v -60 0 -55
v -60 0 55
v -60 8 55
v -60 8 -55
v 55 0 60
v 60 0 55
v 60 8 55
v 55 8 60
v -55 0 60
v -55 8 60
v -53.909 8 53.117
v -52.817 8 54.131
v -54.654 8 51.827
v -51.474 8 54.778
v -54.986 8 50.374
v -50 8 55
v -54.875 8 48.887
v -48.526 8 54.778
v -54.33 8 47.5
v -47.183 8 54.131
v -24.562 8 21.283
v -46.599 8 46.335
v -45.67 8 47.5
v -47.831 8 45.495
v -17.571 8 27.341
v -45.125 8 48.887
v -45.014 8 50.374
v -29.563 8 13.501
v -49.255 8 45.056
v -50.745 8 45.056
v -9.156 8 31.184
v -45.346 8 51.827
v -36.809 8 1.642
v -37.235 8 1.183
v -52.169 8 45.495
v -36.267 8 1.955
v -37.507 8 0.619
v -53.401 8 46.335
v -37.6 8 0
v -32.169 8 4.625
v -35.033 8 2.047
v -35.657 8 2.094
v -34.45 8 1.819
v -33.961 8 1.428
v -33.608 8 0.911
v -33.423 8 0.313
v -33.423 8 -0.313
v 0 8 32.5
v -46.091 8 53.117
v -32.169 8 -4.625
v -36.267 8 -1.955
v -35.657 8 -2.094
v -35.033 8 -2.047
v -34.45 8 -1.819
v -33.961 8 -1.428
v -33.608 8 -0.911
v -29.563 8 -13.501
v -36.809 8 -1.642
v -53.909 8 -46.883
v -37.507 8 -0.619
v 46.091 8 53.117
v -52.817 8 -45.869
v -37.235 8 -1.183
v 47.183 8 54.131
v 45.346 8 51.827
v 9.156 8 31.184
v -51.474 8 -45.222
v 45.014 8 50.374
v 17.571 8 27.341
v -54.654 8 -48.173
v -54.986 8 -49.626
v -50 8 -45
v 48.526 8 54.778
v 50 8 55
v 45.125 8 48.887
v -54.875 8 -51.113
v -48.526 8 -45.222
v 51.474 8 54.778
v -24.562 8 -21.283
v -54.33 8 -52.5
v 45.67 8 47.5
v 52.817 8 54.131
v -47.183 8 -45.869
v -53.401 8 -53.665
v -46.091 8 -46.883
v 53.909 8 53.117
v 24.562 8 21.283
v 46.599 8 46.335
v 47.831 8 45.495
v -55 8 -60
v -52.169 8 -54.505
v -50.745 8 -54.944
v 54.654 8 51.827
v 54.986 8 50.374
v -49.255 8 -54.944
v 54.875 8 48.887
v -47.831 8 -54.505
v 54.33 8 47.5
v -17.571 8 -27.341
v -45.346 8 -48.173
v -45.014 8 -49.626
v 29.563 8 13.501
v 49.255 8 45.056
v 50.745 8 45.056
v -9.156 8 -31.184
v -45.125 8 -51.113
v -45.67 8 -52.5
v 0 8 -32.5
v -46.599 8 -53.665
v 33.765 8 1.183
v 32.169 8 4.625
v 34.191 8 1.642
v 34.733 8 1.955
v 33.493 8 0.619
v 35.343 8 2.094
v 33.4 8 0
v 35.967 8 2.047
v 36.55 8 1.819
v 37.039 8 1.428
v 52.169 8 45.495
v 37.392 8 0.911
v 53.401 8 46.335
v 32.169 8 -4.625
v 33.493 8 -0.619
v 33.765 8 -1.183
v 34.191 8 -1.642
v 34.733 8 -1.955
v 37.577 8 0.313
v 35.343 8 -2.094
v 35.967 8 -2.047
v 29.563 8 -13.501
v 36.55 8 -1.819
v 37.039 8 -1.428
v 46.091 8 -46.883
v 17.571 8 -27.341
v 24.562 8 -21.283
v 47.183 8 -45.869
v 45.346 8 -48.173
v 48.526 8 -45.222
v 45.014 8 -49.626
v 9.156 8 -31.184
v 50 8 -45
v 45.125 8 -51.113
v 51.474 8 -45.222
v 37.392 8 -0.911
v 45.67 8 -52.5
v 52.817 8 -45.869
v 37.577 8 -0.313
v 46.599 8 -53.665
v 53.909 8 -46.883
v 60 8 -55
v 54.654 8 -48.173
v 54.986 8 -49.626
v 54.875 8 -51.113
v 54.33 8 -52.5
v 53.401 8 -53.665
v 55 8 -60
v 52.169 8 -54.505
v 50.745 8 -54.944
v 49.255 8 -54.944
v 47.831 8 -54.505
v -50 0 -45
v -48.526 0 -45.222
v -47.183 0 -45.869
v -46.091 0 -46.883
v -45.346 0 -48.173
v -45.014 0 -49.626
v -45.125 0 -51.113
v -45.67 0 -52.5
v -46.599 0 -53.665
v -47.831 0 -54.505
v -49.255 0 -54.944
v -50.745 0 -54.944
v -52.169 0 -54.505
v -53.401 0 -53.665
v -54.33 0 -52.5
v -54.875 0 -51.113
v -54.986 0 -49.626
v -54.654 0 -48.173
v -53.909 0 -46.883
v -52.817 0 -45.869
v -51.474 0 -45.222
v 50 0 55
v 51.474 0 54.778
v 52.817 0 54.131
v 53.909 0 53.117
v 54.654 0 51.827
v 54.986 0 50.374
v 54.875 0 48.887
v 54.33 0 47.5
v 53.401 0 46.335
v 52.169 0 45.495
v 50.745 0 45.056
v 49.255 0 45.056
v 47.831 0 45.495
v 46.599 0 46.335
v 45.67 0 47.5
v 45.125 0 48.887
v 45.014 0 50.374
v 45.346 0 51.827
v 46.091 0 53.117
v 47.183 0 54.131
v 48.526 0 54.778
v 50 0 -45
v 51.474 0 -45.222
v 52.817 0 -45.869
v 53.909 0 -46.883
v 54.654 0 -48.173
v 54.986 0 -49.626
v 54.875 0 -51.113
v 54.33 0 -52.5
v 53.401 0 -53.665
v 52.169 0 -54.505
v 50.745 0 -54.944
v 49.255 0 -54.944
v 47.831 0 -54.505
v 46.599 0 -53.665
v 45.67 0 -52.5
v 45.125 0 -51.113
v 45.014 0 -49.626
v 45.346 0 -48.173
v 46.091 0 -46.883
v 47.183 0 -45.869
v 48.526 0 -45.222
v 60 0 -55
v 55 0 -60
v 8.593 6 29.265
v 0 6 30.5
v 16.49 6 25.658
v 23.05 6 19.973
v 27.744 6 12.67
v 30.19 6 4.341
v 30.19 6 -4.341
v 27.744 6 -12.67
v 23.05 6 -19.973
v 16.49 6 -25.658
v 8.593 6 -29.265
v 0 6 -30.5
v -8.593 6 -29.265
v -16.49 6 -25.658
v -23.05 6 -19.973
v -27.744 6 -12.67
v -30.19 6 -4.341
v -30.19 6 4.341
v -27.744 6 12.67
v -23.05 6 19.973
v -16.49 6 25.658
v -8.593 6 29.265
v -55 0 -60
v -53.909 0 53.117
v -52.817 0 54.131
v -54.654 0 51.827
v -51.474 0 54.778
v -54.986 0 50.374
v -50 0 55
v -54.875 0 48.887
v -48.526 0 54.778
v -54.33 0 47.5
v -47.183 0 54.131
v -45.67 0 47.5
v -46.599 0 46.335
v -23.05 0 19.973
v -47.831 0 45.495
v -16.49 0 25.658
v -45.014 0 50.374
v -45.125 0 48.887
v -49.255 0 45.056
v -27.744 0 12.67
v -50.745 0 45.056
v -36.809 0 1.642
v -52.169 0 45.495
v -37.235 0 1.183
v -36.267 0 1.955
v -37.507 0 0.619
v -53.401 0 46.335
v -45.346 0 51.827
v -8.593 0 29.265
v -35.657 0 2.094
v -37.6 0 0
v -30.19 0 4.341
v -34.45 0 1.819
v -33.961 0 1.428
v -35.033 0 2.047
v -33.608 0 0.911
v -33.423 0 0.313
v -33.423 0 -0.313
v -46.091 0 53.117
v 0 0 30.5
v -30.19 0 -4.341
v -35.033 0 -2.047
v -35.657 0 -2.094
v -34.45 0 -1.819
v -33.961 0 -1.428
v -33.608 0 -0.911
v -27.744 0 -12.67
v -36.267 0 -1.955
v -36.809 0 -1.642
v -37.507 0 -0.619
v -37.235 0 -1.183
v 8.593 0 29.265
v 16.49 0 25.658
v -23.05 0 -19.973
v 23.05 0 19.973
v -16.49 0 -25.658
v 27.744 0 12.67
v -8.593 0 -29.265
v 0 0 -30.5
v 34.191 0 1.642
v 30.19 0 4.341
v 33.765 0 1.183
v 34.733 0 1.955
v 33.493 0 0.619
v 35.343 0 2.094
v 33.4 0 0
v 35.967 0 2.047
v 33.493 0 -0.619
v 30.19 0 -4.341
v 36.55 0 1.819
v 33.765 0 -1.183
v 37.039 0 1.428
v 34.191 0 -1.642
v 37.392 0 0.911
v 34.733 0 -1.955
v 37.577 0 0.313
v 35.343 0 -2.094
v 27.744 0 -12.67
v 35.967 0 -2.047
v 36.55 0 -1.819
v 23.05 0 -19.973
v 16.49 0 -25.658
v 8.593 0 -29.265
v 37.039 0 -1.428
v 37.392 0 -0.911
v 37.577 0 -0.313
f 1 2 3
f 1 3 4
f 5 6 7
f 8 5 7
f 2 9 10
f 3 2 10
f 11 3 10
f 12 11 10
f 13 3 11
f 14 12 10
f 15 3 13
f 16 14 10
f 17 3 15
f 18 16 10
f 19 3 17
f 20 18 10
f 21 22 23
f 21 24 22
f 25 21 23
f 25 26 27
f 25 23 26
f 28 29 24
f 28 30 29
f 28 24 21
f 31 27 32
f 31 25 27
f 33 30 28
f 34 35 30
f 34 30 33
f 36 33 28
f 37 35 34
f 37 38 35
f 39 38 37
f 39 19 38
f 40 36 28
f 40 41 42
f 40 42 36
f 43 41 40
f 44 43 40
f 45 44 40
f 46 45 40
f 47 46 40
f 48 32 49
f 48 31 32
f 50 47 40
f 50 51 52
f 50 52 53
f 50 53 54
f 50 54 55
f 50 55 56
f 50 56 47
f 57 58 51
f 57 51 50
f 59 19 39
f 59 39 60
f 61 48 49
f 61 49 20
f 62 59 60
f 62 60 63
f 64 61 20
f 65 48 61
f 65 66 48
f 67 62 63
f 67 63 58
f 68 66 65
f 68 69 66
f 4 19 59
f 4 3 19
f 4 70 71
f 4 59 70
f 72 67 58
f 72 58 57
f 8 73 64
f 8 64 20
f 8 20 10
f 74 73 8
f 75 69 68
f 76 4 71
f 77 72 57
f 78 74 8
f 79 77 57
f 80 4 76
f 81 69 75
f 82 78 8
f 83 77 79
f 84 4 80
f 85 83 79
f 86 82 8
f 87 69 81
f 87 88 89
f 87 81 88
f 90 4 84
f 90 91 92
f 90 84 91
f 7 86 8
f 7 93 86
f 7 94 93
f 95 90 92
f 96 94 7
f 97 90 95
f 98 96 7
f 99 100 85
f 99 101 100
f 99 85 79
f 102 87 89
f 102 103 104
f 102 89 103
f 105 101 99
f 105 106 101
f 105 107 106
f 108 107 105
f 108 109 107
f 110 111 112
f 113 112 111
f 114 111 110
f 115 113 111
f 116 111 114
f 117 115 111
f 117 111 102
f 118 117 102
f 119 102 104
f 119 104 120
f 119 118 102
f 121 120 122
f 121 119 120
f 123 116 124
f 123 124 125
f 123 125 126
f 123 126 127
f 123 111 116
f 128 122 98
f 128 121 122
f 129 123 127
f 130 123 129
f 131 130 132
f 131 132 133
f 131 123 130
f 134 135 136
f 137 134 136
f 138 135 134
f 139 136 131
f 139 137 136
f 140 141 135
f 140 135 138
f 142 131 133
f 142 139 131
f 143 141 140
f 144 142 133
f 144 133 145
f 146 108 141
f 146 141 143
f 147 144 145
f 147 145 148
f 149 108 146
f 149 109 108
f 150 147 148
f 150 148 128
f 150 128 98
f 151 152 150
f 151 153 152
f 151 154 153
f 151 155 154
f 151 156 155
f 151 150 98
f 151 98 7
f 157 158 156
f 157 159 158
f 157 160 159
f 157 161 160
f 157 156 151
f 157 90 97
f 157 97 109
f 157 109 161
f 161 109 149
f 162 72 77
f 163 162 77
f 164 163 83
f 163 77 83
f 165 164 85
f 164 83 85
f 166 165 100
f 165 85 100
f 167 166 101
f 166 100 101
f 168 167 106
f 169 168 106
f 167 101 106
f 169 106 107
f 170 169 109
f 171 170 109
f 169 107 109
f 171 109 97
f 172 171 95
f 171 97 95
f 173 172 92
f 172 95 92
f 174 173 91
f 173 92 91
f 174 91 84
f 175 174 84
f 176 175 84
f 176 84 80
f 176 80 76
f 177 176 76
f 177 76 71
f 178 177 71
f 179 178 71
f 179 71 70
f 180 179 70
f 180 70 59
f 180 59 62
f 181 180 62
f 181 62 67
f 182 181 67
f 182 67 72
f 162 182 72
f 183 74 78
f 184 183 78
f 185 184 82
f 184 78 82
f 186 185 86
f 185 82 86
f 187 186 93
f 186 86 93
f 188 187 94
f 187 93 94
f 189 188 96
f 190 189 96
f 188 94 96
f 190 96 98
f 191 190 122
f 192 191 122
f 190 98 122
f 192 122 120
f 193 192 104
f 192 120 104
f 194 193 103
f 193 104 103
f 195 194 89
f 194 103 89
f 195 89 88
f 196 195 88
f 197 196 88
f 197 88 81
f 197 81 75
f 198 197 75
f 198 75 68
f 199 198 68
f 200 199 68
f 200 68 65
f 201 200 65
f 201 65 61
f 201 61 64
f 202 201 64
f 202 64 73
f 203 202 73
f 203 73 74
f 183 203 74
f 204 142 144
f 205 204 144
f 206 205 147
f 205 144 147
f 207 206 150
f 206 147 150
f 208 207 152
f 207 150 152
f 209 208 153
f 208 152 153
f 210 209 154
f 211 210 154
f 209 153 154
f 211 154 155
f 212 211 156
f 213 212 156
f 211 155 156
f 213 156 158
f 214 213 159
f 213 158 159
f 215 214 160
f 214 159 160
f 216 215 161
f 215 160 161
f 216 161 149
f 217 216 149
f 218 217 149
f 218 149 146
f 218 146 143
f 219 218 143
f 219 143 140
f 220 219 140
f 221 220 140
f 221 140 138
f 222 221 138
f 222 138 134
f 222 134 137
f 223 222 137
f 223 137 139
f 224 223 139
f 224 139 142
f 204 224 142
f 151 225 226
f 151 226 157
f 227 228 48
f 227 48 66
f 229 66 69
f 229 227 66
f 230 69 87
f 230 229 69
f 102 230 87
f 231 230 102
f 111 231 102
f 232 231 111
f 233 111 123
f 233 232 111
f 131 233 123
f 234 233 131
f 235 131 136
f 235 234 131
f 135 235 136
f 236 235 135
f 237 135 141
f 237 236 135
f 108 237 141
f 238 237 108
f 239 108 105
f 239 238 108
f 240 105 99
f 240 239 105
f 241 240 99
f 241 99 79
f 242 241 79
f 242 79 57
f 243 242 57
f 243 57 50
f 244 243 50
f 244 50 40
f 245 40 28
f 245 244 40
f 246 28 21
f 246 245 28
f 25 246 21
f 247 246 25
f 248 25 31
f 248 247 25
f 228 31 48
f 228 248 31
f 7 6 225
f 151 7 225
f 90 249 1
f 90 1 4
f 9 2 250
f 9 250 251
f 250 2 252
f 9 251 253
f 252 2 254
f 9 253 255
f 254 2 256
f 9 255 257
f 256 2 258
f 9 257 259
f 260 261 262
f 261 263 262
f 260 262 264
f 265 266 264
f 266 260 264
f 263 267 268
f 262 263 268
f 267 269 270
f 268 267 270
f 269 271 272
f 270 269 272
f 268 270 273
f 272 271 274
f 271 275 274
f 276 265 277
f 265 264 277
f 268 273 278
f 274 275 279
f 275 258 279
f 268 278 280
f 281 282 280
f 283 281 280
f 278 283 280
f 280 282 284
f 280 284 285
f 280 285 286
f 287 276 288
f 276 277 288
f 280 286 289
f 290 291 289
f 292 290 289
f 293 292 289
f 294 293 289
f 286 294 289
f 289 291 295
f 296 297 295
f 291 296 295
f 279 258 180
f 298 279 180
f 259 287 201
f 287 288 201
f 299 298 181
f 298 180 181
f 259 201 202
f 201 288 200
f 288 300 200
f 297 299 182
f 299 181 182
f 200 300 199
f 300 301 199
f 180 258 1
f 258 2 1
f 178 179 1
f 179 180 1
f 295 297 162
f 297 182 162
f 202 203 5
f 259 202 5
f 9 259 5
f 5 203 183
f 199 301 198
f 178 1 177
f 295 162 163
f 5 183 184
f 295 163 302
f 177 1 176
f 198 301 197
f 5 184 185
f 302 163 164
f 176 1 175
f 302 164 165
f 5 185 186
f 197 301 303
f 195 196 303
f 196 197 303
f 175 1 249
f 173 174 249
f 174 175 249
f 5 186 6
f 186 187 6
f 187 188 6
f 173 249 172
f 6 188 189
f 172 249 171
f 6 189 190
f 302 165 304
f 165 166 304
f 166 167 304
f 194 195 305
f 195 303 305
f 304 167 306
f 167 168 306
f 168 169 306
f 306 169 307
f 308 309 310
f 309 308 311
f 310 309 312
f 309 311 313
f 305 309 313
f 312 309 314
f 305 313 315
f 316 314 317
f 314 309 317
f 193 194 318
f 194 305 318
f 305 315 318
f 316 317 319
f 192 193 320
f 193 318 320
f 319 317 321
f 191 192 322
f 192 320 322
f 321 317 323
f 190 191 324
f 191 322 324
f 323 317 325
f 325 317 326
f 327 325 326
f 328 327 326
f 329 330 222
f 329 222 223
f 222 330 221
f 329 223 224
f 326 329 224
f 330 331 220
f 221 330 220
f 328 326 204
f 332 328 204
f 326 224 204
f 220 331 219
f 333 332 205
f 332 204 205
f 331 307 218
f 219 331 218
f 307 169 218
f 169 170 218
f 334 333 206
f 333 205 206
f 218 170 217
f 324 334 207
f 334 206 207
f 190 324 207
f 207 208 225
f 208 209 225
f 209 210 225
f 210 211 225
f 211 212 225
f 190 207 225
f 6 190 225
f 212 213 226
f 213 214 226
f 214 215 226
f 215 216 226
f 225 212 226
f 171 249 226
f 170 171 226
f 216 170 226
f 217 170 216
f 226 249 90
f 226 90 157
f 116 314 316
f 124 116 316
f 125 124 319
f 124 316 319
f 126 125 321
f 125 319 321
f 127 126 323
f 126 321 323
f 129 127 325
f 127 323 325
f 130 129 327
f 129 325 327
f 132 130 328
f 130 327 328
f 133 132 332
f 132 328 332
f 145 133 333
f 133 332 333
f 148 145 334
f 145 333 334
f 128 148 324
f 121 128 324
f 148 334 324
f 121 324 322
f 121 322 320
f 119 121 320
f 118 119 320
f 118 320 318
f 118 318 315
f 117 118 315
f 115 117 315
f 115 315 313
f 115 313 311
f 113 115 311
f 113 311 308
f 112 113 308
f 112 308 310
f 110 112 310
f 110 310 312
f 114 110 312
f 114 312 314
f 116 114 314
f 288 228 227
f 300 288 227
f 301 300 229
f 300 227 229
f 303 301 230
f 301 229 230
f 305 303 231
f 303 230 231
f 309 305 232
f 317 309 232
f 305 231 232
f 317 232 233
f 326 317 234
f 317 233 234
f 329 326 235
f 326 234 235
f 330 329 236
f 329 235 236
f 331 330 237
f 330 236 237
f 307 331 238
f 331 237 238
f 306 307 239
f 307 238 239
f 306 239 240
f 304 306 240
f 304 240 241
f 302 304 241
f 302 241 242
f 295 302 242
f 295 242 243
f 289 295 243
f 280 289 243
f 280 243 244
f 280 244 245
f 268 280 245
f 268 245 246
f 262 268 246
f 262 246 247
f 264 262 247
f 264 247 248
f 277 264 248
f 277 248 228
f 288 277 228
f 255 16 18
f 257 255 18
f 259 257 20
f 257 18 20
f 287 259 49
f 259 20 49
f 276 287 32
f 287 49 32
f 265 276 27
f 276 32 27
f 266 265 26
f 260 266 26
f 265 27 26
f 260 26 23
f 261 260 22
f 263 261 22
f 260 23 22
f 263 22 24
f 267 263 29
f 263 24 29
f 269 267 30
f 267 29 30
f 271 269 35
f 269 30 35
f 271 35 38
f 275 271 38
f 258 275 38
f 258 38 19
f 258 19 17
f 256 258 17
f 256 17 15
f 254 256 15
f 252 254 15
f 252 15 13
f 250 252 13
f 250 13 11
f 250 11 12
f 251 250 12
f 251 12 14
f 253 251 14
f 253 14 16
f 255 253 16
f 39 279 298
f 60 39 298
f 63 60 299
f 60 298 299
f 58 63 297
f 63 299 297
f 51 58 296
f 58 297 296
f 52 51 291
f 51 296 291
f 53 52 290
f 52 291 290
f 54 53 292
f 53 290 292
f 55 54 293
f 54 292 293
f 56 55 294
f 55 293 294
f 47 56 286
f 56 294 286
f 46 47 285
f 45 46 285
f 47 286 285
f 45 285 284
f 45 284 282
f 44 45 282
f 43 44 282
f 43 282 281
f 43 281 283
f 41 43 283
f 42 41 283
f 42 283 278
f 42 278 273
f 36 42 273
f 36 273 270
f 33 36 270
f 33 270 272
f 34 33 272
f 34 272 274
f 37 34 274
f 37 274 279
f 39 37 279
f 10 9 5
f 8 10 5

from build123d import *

# Parameters (mm, degrees)
SKETCH1_W           = 120
SKETCH1_H           = 120
BOSS_EXTRUDE1_DEPTH = 8
CUT_EXTRUDE1_REACH  = 87.229
SKETCH2_R           = 30.5
CHAMFER1_SIZE       = 2
CUT_EXTRUDE2_REACH  = 87.229
SKETCH3_R           = 5
CHAMFER2_SIZE       = 5
M5_TAPPED_HOLE1_D   = 4.2


with BuildPart() as part:
    # Sketch1 → Boss-Extrude1 (new body)
    with BuildSketch(Plane(origin=(0, 0, 0), x_dir=(1, 0, 0), z_dir=(0, 1, 0))):
        Rectangle(SKETCH1_W, SKETCH1_H)
    extrude(amount=BOSS_EXTRUDE1_DEPTH)

    # Sketch2 → Cut-Extrude1 (cut, up to next)
    with BuildSketch(Plane(origin=(0, 8, 0), x_dir=(1, 0, 0), z_dir=(0, 1, 0)), mode=Mode.PRIVATE) as cut_extrude1_sk1:
        with Locations(Location((0, 0, 0), (0, 0, 270))):
            Circle(SKETCH2_R)
    cut_extrude1_tool1 = extrude(cut_extrude1_sk1.sketch, amount=-CUT_EXTRUDE1_REACH, mode=Mode.PRIVATE) & part.part
    add(cut_extrude1_tool1.solids().sort_by_distance((0, 8, 0))[0], mode=Mode.SUBTRACT)

    # Chamfer1
    chamfer1_edges = [part.edges().sort_by_distance(p)[0] for p in [
        (0, 8, -30.5),
    ]]
    chamfer(chamfer1_edges, length=CHAMFER1_SIZE)

    # Sketch3 → Cut-Extrude2 (cut, up to next)
    with BuildSketch(Plane(origin=(0, 8, 0), x_dir=(1, 0, 0), z_dir=(0, 1, 0)), mode=Mode.PRIVATE) as cut_extrude2_sk1:
        with Locations(Location((-50, 50, 0), (0, 0, 270))):
            Circle(SKETCH3_R)
    cut_extrude2_tool1 = extrude(cut_extrude2_sk1.sketch, amount=-CUT_EXTRUDE2_REACH, mode=Mode.PRIVATE) & part.part
    # Sketch3 → Cut-Extrude2 (cut, up to next)
    with BuildSketch(Plane(origin=(0, 8, 0), x_dir=(1, 0, 0), z_dir=(0, 1, 0)), mode=Mode.PRIVATE) as cut_extrude2_sk2:
        with Locations(Location((50, 50, 0), (0, 0, 270))):
            Circle(SKETCH3_R)
    cut_extrude2_tool2 = extrude(cut_extrude2_sk2.sketch, amount=-CUT_EXTRUDE2_REACH, mode=Mode.PRIVATE) & part.part
    # Sketch3 → Cut-Extrude2 (cut, up to next)
    with BuildSketch(Plane(origin=(0, 8, 0), x_dir=(1, 0, 0), z_dir=(0, 1, 0)), mode=Mode.PRIVATE) as cut_extrude2_sk3:
        with Locations(Location((-50, -50, 0), (0, 0, 270))):
            Circle(SKETCH3_R)
    cut_extrude2_tool3 = extrude(cut_extrude2_sk3.sketch, amount=-CUT_EXTRUDE2_REACH, mode=Mode.PRIVATE) & part.part
    # Sketch3 → Cut-Extrude2 (cut, up to next)
    with BuildSketch(Plane(origin=(0, 8, 0), x_dir=(1, 0, 0), z_dir=(0, 1, 0)), mode=Mode.PRIVATE) as cut_extrude2_sk4:
        with Locations(Location((50, -50, 0), (0, 0, 270))):
            Circle(SKETCH3_R)
    cut_extrude2_tool4 = extrude(cut_extrude2_sk4.sketch, amount=-CUT_EXTRUDE2_REACH, mode=Mode.PRIVATE) & part.part
    add(cut_extrude2_tool1.solids().sort_by_distance((-50, 8, -50))[0], mode=Mode.SUBTRACT)
    add(cut_extrude2_tool2.solids().sort_by_distance((50, 8, -50))[0], mode=Mode.SUBTRACT)
    add(cut_extrude2_tool3.solids().sort_by_distance((-50, 8, 50))[0], mode=Mode.SUBTRACT)
    add(cut_extrude2_tool4.solids().sort_by_distance((50, 8, 50))[0], mode=Mode.SUBTRACT)

    # Chamfer2
    chamfer2_edges = [part.edges().sort_by_distance(p)[0] for p in [
        (-60, 4, -60),
        (60, 4, -60),
        (60, 4, 60),
        (-60, 4, 60),
    ]]
    chamfer(chamfer2_edges, length=CHAMFER2_SIZE)

    # M5 Tapped Hole1 (through all)
    with Locations(Plane(origin=(0, 8, 0), x_dir=(1, 0, 0), z_dir=(0, 1, 0))):
        with Locations((-35.5, 0), (35.5, 0)):
            Hole(M5_TAPPED_HOLE1_D / 2)


solid = part.part
